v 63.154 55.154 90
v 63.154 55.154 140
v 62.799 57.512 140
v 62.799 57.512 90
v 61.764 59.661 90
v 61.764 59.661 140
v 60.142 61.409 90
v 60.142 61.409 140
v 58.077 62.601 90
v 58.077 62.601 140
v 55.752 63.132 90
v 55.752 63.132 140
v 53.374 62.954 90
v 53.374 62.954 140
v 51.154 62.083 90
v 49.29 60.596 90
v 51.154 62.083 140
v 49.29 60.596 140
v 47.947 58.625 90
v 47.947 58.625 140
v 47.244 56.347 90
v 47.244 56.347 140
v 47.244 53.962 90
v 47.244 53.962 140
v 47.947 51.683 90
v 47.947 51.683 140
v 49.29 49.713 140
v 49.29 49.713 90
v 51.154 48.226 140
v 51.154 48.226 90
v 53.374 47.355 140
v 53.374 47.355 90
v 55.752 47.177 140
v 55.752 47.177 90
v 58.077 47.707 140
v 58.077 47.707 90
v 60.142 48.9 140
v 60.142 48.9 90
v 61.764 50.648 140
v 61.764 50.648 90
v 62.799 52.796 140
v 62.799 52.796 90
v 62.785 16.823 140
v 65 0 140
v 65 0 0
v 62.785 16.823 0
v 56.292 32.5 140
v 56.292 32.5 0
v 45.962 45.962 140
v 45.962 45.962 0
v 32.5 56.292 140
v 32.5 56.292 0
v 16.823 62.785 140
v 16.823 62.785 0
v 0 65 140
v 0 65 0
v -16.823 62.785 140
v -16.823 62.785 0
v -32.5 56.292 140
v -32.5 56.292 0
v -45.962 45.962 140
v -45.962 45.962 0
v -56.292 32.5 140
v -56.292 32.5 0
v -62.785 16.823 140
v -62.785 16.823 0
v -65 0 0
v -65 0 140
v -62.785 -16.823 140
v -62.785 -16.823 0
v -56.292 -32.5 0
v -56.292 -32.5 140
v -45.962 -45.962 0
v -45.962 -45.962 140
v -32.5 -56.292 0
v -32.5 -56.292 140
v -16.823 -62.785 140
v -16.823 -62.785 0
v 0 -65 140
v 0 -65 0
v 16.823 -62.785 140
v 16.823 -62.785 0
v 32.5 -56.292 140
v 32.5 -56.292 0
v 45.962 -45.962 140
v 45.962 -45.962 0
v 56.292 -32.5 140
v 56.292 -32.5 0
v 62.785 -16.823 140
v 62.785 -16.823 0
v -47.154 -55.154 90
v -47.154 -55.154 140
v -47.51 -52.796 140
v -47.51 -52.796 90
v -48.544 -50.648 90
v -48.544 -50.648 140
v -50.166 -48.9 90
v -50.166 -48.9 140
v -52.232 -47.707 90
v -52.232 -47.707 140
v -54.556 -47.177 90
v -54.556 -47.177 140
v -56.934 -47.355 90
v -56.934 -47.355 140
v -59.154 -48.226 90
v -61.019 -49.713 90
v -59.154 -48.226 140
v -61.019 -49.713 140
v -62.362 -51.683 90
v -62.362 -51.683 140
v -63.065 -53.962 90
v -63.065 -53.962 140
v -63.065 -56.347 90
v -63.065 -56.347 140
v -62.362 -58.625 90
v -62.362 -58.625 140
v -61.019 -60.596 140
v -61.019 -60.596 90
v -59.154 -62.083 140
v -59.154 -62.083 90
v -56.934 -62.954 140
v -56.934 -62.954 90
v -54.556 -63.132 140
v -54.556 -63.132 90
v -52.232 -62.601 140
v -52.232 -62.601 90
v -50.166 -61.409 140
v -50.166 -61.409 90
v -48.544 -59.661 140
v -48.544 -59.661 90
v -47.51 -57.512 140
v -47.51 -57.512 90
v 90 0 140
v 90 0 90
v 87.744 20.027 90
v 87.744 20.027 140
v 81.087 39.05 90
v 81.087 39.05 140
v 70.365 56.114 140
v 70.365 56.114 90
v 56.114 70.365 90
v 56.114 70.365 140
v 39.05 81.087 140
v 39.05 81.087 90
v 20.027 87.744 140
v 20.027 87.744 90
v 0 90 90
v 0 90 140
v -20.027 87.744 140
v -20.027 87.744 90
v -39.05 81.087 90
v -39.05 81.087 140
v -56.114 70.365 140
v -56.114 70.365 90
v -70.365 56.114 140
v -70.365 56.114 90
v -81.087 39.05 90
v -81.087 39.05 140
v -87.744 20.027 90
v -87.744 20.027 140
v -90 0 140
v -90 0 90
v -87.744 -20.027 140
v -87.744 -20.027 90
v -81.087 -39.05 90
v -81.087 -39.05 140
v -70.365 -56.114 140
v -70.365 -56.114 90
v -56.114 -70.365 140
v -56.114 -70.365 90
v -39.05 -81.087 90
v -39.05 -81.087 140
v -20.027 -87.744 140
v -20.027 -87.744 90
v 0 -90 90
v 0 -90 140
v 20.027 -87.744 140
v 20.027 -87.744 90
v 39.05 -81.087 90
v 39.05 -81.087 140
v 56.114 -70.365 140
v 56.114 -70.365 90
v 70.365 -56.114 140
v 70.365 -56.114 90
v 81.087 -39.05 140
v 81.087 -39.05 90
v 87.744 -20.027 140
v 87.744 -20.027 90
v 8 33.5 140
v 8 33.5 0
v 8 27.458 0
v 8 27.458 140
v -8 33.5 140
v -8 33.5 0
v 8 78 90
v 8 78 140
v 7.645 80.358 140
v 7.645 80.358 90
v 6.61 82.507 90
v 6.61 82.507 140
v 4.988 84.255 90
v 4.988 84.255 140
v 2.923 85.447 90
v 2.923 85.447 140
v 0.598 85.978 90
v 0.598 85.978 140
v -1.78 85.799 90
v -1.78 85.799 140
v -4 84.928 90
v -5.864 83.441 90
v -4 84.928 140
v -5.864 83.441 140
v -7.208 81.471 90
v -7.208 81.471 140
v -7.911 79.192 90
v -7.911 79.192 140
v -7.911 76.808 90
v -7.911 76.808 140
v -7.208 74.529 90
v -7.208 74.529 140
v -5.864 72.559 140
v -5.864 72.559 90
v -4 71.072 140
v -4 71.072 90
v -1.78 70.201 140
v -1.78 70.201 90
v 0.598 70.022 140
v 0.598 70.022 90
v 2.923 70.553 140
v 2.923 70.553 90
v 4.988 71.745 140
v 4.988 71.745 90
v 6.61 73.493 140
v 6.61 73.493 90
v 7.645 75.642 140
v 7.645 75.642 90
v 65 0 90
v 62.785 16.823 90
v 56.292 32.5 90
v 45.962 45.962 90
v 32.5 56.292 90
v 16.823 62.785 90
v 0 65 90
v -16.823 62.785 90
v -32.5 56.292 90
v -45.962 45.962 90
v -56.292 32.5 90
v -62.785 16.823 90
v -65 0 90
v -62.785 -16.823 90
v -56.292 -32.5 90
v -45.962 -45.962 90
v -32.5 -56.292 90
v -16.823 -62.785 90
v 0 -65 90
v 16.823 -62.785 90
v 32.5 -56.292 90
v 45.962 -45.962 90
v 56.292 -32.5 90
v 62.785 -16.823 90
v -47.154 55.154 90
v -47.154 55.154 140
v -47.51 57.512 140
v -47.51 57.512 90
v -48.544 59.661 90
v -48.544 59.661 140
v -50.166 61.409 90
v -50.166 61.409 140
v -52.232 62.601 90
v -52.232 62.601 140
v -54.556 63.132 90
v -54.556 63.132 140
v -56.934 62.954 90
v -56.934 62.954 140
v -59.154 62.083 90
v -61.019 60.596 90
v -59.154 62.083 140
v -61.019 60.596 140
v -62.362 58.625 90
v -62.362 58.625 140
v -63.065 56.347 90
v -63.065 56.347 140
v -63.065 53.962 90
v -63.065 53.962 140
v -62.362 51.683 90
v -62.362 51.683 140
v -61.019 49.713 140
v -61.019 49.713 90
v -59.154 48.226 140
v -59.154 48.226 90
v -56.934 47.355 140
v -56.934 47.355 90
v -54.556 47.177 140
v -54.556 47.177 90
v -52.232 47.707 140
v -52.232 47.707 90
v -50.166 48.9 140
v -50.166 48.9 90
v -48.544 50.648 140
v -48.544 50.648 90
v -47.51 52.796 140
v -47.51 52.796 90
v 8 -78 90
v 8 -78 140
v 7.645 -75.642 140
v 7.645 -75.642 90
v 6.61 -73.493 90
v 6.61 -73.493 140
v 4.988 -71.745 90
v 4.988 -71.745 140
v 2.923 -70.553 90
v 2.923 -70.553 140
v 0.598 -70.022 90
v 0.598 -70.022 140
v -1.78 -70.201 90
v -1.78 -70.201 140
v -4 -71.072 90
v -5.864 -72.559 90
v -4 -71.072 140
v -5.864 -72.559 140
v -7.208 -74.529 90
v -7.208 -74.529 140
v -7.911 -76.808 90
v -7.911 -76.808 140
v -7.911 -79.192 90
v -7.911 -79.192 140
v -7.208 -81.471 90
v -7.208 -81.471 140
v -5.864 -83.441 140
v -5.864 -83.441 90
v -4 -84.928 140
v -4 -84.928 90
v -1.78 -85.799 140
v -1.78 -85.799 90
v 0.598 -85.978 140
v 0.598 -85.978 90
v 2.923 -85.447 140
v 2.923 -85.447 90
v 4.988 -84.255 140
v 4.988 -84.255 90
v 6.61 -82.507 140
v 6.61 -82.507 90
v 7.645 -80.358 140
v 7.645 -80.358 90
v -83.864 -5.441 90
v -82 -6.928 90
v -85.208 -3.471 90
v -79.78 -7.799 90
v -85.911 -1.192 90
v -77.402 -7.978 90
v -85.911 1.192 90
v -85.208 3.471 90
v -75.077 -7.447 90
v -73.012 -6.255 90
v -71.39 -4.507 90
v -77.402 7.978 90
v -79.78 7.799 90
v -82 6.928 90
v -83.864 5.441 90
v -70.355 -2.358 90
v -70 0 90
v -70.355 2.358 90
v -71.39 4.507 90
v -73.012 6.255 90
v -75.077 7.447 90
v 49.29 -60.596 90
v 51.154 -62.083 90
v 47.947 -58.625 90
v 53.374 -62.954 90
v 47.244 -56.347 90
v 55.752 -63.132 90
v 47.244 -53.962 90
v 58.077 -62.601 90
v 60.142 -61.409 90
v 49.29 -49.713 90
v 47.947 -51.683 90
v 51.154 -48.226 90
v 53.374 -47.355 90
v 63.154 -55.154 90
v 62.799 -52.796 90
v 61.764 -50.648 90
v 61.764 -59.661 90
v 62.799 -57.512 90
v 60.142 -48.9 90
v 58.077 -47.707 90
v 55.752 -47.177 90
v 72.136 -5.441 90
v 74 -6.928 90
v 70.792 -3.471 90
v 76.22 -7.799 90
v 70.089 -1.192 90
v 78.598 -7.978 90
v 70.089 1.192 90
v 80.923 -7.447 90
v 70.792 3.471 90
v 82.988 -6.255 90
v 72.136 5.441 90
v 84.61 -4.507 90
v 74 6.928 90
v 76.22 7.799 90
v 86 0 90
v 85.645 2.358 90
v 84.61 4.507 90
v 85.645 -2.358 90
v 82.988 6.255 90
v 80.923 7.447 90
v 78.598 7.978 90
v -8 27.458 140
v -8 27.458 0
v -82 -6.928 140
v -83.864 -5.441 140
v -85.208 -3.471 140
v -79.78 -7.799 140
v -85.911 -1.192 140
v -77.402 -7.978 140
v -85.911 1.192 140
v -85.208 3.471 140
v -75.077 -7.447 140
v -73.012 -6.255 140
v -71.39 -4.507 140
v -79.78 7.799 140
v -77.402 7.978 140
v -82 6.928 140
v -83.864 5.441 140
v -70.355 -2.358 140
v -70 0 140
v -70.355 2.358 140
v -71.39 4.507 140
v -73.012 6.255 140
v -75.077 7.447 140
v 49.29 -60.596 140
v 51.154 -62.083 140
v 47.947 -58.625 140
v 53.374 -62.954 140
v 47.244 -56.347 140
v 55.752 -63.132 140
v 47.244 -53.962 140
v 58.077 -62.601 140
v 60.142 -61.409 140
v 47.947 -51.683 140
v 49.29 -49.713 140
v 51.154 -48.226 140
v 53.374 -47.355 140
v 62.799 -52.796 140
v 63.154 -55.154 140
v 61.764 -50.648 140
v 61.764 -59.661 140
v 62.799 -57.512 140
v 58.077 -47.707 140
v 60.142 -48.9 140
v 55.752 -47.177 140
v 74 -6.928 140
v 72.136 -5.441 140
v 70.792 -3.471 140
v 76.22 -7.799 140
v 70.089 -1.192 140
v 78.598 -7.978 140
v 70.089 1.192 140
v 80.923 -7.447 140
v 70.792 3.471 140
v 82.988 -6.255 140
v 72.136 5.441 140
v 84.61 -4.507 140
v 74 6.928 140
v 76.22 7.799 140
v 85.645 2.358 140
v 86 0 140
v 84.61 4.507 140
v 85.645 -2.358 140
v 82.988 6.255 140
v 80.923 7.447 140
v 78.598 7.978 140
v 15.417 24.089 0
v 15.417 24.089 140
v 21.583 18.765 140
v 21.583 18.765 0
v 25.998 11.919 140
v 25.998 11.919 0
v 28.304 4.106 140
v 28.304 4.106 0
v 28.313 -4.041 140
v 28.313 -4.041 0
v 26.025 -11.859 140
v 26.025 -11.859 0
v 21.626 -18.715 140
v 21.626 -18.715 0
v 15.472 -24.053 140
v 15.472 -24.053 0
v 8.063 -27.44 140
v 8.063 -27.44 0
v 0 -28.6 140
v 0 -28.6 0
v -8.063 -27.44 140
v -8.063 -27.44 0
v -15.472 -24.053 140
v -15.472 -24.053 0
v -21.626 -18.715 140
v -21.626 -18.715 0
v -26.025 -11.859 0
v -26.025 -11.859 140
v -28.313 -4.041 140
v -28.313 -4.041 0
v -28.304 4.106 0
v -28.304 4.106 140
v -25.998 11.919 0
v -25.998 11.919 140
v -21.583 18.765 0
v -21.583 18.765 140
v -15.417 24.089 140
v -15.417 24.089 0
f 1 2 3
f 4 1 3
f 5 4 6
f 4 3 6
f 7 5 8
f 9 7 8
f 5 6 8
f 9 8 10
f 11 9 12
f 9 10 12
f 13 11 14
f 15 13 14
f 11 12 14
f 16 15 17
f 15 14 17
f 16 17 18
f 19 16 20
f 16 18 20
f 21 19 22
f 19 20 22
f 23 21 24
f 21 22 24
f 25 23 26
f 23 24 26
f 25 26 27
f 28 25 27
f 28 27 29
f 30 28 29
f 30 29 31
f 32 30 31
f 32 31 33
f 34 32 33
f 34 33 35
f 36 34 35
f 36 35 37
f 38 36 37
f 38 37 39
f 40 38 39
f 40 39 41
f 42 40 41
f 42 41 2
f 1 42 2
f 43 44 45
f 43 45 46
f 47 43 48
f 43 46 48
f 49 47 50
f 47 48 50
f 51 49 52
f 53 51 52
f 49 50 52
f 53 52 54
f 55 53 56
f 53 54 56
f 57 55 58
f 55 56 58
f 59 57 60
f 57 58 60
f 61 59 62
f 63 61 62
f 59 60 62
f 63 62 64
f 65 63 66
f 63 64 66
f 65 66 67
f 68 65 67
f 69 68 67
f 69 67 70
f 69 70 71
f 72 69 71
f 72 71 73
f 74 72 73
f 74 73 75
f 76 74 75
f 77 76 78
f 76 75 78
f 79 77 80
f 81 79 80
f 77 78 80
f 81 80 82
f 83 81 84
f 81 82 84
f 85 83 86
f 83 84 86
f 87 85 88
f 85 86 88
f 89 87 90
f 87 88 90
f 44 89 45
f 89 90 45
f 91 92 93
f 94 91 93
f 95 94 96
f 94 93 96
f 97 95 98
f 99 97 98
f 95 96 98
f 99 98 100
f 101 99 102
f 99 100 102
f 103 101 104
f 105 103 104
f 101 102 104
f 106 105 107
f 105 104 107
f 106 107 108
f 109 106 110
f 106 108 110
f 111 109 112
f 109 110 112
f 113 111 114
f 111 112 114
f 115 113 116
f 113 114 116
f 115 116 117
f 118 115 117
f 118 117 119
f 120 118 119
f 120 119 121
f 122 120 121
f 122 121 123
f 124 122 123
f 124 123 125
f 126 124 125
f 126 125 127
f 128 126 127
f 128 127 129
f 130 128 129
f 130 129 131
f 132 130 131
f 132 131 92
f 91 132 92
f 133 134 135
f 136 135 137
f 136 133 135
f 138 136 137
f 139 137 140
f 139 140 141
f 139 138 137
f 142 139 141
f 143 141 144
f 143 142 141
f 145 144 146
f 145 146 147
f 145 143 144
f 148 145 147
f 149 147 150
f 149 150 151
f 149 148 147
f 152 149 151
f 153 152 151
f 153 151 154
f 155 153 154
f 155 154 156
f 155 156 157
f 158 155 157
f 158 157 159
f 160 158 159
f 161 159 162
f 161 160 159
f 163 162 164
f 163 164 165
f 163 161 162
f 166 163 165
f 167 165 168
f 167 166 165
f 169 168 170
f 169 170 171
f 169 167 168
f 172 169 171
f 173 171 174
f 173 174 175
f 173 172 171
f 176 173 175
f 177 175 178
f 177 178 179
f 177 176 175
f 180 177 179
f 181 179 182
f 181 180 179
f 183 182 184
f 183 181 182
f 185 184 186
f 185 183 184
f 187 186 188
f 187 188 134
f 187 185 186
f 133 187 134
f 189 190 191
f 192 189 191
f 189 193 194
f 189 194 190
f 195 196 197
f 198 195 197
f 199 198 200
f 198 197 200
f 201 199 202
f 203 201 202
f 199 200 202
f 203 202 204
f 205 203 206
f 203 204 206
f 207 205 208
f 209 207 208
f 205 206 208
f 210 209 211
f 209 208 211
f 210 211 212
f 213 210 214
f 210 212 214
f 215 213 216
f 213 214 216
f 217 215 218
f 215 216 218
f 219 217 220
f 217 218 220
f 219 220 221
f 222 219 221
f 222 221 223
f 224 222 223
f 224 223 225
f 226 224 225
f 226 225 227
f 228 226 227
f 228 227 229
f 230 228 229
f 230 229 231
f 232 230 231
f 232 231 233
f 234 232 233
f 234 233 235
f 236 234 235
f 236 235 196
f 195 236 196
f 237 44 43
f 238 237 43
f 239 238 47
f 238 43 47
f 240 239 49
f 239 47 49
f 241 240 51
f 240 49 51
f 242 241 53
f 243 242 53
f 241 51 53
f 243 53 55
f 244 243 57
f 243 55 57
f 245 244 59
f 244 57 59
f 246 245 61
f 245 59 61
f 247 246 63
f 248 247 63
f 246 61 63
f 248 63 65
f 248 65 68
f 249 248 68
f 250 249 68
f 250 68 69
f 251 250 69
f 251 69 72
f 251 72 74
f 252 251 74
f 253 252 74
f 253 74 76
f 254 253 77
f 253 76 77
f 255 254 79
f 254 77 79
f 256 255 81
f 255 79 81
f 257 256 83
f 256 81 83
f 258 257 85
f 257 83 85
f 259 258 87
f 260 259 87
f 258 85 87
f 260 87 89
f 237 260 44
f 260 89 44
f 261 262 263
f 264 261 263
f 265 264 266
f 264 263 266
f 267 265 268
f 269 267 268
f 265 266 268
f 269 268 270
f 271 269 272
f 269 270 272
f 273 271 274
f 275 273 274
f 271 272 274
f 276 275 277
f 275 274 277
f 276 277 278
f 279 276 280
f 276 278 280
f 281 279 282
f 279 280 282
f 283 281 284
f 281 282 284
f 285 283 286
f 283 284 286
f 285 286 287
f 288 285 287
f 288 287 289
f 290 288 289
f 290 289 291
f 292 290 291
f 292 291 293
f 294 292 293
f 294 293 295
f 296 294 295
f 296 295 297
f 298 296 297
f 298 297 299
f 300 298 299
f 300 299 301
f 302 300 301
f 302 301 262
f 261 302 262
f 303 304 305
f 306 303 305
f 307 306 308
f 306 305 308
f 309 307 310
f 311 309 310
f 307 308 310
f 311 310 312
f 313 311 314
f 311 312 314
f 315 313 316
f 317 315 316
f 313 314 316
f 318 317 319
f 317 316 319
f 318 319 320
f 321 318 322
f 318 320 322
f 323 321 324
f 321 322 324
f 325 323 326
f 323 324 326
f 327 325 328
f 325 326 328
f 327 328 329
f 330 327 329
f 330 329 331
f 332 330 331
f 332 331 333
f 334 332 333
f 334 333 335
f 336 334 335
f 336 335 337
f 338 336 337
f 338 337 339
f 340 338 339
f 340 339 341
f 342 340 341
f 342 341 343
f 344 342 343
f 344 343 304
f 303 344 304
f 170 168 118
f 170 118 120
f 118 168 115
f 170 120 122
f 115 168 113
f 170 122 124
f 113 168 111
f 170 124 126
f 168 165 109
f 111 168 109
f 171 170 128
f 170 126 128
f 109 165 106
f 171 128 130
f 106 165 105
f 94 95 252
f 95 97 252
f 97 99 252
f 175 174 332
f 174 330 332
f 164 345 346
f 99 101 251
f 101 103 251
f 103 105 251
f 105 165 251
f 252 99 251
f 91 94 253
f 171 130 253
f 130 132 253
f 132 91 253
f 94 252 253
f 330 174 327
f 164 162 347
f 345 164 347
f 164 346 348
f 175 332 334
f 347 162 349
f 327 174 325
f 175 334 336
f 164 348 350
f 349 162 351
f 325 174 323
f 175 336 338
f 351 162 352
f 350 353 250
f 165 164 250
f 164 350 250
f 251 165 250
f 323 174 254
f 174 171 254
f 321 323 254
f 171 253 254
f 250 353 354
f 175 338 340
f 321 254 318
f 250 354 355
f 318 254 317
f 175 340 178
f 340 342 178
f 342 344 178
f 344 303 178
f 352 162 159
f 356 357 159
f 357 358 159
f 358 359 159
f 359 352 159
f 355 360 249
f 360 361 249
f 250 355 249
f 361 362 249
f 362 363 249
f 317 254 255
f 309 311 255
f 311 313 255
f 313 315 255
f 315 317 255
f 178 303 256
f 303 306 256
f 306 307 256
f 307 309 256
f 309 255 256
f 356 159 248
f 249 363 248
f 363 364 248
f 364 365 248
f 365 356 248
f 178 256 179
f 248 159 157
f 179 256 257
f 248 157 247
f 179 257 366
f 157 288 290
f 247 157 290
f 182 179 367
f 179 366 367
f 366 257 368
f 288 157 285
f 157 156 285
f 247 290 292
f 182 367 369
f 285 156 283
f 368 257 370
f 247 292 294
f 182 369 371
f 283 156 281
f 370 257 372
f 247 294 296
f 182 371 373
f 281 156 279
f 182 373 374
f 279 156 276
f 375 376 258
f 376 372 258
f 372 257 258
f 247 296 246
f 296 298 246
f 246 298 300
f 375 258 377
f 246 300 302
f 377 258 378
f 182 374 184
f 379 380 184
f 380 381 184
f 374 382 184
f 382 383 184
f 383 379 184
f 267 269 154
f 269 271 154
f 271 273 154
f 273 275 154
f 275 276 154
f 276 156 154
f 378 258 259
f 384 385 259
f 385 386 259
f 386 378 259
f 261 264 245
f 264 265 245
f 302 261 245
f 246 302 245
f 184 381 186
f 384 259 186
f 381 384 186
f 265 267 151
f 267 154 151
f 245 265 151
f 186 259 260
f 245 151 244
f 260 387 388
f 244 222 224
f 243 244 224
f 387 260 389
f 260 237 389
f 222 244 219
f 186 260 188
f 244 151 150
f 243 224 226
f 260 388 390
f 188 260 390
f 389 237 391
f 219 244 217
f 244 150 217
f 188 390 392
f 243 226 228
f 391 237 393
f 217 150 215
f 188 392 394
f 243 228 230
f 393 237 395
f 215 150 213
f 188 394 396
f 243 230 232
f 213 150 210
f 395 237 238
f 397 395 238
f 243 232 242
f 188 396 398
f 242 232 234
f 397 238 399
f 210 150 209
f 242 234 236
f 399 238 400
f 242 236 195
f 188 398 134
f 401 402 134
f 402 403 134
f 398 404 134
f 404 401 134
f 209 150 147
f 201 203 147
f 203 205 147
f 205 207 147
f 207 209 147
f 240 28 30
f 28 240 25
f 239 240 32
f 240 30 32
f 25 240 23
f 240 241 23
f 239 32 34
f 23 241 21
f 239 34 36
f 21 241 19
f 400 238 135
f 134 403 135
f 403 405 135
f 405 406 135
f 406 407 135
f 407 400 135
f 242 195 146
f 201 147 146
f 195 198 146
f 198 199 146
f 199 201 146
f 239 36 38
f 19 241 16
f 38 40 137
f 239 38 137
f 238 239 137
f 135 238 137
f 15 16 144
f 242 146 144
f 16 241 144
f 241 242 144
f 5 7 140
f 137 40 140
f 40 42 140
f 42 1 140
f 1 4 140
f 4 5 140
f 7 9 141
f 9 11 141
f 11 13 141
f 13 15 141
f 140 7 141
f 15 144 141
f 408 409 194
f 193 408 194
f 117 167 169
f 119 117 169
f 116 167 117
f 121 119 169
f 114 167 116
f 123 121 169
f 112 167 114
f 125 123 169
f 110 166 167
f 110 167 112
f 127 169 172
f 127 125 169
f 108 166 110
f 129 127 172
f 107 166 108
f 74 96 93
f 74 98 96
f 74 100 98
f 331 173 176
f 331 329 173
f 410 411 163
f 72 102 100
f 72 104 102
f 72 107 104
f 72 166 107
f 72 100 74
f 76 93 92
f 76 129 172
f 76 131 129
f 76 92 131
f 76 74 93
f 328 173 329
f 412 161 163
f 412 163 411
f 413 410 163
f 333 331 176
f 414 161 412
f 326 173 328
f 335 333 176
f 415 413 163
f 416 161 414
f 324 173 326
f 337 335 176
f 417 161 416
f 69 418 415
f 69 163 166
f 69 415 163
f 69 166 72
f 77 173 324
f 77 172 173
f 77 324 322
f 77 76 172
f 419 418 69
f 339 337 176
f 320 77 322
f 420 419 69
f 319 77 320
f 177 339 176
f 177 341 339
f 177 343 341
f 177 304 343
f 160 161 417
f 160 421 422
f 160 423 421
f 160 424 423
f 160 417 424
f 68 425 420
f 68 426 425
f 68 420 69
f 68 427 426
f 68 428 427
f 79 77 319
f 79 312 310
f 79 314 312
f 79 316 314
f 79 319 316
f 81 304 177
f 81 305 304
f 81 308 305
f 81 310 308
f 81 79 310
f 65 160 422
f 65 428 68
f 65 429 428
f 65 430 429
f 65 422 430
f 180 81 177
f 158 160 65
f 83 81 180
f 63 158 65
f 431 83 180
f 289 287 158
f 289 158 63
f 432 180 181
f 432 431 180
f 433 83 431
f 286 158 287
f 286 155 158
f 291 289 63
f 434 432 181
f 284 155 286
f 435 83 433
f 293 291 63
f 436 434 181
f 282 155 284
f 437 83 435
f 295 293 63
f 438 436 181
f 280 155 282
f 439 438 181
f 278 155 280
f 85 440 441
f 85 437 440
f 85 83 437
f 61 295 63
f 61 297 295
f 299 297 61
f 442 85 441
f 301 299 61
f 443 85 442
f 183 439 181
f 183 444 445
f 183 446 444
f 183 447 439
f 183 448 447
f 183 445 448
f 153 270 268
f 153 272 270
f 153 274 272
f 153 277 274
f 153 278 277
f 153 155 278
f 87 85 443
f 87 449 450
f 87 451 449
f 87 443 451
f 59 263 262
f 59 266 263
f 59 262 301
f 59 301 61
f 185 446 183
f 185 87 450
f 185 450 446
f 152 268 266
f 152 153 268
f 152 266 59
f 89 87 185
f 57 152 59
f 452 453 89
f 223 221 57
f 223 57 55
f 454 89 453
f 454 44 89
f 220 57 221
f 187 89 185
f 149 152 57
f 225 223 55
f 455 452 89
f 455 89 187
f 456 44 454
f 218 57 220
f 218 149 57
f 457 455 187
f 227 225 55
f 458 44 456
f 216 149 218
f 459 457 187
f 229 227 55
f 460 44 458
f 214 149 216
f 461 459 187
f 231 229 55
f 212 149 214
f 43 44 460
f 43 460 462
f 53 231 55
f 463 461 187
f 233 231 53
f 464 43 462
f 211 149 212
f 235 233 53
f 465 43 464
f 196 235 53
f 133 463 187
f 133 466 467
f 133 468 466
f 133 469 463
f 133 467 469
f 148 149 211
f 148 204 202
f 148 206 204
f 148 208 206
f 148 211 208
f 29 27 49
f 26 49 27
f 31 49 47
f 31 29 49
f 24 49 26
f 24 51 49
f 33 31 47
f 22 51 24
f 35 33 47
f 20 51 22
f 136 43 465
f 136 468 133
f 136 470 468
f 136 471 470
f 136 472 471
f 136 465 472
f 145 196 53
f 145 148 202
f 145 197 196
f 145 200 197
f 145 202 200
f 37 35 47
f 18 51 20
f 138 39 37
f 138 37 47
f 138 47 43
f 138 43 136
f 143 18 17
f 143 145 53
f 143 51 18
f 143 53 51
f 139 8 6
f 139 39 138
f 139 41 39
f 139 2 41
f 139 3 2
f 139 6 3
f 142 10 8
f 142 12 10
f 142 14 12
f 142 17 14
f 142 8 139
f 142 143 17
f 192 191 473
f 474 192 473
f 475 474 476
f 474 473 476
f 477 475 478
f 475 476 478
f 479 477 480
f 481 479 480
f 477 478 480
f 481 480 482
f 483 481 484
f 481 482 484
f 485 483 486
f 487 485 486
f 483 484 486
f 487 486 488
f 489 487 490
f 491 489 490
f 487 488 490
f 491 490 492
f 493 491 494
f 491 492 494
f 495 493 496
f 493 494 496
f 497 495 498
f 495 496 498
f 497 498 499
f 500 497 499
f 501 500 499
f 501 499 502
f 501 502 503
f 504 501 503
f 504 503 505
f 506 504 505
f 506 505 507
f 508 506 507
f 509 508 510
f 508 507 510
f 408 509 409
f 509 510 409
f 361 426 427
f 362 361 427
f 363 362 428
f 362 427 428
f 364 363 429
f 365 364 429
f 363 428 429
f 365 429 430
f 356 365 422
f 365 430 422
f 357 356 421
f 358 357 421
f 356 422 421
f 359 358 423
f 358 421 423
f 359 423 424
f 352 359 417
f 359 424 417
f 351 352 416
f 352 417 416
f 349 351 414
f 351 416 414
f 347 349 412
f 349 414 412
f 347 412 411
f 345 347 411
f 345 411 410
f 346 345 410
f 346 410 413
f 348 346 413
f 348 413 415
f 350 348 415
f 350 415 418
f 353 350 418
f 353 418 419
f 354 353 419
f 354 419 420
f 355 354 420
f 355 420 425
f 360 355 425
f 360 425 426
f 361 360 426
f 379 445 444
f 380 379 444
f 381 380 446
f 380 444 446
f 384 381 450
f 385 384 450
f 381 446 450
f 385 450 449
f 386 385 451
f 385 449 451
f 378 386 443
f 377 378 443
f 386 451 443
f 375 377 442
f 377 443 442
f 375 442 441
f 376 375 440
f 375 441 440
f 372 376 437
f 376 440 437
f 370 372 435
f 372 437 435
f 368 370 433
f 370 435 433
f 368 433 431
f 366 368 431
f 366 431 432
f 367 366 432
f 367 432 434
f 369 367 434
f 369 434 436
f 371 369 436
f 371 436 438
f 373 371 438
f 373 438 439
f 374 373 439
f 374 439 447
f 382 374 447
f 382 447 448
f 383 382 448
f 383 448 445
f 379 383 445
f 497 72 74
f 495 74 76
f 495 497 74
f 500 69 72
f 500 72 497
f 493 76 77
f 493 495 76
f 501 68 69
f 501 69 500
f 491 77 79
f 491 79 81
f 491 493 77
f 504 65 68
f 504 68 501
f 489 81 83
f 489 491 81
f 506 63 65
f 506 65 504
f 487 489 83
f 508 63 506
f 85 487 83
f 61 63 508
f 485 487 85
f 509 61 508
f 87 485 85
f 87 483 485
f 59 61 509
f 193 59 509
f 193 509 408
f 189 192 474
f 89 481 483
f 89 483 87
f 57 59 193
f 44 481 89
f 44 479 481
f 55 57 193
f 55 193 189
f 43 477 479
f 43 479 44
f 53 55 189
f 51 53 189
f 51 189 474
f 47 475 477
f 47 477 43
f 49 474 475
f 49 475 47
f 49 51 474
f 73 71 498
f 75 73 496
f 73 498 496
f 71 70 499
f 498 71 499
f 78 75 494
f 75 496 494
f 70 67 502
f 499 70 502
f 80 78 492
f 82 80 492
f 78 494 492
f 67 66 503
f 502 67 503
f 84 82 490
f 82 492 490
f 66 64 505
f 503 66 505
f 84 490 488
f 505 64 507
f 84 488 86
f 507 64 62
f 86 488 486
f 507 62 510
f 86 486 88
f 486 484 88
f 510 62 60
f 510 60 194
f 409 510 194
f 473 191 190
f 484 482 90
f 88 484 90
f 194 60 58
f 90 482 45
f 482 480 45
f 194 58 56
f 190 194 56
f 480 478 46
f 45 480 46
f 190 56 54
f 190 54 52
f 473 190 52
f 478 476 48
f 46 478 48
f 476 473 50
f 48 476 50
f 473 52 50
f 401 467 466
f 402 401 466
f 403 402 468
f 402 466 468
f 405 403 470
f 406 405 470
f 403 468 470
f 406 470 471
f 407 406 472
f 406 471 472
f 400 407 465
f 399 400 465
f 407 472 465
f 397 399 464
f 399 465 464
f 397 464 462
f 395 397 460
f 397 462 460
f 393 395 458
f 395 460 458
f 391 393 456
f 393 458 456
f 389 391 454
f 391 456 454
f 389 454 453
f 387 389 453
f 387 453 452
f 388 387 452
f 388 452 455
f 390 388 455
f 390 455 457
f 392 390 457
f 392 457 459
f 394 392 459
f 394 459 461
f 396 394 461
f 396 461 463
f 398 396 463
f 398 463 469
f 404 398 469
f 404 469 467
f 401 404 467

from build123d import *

# Parameters (mm, degrees)
F0_R     = 65
F1_DEPTH = 140
F2_R     = 90
F2_R_2   = 65
F3_DEPTH = 50
F4_R     = 8
F5_DEPTH = 100


with BuildPart() as f1:
    # F0 (on Top) → F1 (new body)
    with BuildSketch(Plane.XY):
        Circle(F0_R)
        with BuildLine():
            ThreePointArc((8, 27.458332), (0, -28.6), (-8, 27.458332))
            Line((-8, 27.458332), (-8, 33.5))
            Line((-8, 33.5), (8, 33.5))
            Line((8, 33.5), (8, 27.458332))
        make_face(mode=Mode.SUBTRACT)
    extrude(amount=F1_DEPTH)


with BuildPart() as f3:
    # F2 (on face) → F3 (new body)
    with BuildSketch(Plane.XY.offset(140)):
        Circle(F2_R)
        Circle(F2_R_2, mode=Mode.SUBTRACT)
    extrude(amount=-F3_DEPTH)

    # F4 (on face) → F5 (cut)
    with BuildSketch(Plane.XY.offset(140)):
        with Locations((-55.154329, 55.154329)):
            Circle(F4_R)
        with Locations((0, 78)):
            Circle(F4_R)
        with Locations((55.154329, 55.154329)):
            Circle(F4_R)
        with Locations((78, 0)):
            Circle(F4_R)
        with Locations((55.154329, -55.154329)):
            Circle(F4_R)
        with Locations((0, -78)):
            Circle(F4_R)
        with Locations((-55.154329, -55.154329)):
            Circle(F4_R)
        with Locations((-78, 0)):
            Circle(F4_R)
    extrude(amount=-F5_DEPTH, mode=Mode.SUBTRACT)


solid = Compound([f1.part, f3.part])
